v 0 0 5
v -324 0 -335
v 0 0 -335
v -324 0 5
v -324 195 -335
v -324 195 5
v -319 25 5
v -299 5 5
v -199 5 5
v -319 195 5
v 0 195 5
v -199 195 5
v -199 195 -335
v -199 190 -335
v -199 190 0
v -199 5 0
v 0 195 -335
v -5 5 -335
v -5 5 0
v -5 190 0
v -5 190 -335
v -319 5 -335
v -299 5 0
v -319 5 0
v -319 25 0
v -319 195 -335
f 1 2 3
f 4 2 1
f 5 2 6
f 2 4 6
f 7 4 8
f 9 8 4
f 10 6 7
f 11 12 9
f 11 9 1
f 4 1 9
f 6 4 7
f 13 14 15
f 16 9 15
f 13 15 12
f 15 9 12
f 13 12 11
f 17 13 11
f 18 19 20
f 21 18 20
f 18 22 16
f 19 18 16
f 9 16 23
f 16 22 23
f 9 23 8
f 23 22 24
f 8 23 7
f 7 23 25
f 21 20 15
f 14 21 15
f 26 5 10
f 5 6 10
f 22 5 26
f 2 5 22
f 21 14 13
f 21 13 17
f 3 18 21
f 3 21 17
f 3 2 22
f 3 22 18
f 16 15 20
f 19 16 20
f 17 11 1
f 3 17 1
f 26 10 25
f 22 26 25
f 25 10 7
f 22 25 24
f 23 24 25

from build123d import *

# Parameters (mm, degrees)
F1_DEPTH = 5
F3_DEPTH = 335
F4_W     = 5
F4_H     = 335
F5_DEPTH = 319
F7_DEPTH = 335


with BuildPart() as f1:
    # F0 (on Top) → F1 (new body)
    with BuildSketch(Plane.XY):
        Polygon((-324, 0), (0, 0), (0, 195), (-199, 195), (-199, 5), (-299, 5), (-319, 25), (-319, 195), (-324, 195), align=None)
    extrude(amount=F1_DEPTH)

    # F2 (on face) → F3 (join)
    with BuildSketch(Plane(origin=(0, 0, 0), x_dir=(1, 0, 0), z_dir=(0, 0, -1))):
        Polygon((-319, 0), (-324, 0), (-324, -195), (-319, -195), (-319, -25), align=None)
    extrude(amount=F3_DEPTH)

    # F4 (on face) → F5 (join, through all)
    with BuildSketch(Plane.YZ.offset(-319)):
        with Locations((2.5, -167.5)):
            Rectangle(F4_W, F4_H)
    extrude(amount=F5_DEPTH)

    # F6 (on face) → F7 (join, through all)
    with BuildSketch(Plane(origin=(0, 0, 0), x_dir=(1, 0, 0), z_dir=(0, 0, -1))):
        Polygon((0, -195), (0, -5), (-5, -5), (-5, -190), (-199, -190), (-199, -195), align=None)
    extrude(amount=F7_DEPTH)


solid = f1.part
